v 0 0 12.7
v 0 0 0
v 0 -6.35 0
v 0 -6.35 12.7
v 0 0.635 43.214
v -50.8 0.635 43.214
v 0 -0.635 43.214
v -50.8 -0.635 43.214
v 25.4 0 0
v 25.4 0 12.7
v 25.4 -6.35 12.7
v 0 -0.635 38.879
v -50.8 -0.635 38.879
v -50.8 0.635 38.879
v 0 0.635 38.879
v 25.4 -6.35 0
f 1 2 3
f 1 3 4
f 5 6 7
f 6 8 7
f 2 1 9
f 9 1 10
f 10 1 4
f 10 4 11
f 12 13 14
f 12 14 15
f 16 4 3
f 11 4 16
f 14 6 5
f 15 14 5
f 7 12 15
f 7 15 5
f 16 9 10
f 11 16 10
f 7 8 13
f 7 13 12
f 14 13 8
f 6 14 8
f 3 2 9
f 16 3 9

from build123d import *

# Parameters (mm, degrees)
F0_W     = 25.4
F0_H     = 12.7
F1_DEPTH = 6.35
F2_W     = 50.8
F2_H     = 4.334929
F3_DEPTH = 0.635


with BuildPart() as f1:
    # F0 (on Front) → F1 (new body)
    with BuildSketch(Plane.XZ):
        with Locations((12.7, 6.35)):
            Rectangle(F0_W, F0_H)
    extrude(amount=F1_DEPTH)


with BuildPart() as f3:
    # F2 (on Front) → F3 (new body, symmetric)
    with BuildSketch(Plane.XZ):
        with Locations((-25.4, 41.046399)):
            Rectangle(F2_W, F2_H)
    extrude(amount=F3_DEPTH, both=True)


solid = Compound([f1.part, f3.part])
